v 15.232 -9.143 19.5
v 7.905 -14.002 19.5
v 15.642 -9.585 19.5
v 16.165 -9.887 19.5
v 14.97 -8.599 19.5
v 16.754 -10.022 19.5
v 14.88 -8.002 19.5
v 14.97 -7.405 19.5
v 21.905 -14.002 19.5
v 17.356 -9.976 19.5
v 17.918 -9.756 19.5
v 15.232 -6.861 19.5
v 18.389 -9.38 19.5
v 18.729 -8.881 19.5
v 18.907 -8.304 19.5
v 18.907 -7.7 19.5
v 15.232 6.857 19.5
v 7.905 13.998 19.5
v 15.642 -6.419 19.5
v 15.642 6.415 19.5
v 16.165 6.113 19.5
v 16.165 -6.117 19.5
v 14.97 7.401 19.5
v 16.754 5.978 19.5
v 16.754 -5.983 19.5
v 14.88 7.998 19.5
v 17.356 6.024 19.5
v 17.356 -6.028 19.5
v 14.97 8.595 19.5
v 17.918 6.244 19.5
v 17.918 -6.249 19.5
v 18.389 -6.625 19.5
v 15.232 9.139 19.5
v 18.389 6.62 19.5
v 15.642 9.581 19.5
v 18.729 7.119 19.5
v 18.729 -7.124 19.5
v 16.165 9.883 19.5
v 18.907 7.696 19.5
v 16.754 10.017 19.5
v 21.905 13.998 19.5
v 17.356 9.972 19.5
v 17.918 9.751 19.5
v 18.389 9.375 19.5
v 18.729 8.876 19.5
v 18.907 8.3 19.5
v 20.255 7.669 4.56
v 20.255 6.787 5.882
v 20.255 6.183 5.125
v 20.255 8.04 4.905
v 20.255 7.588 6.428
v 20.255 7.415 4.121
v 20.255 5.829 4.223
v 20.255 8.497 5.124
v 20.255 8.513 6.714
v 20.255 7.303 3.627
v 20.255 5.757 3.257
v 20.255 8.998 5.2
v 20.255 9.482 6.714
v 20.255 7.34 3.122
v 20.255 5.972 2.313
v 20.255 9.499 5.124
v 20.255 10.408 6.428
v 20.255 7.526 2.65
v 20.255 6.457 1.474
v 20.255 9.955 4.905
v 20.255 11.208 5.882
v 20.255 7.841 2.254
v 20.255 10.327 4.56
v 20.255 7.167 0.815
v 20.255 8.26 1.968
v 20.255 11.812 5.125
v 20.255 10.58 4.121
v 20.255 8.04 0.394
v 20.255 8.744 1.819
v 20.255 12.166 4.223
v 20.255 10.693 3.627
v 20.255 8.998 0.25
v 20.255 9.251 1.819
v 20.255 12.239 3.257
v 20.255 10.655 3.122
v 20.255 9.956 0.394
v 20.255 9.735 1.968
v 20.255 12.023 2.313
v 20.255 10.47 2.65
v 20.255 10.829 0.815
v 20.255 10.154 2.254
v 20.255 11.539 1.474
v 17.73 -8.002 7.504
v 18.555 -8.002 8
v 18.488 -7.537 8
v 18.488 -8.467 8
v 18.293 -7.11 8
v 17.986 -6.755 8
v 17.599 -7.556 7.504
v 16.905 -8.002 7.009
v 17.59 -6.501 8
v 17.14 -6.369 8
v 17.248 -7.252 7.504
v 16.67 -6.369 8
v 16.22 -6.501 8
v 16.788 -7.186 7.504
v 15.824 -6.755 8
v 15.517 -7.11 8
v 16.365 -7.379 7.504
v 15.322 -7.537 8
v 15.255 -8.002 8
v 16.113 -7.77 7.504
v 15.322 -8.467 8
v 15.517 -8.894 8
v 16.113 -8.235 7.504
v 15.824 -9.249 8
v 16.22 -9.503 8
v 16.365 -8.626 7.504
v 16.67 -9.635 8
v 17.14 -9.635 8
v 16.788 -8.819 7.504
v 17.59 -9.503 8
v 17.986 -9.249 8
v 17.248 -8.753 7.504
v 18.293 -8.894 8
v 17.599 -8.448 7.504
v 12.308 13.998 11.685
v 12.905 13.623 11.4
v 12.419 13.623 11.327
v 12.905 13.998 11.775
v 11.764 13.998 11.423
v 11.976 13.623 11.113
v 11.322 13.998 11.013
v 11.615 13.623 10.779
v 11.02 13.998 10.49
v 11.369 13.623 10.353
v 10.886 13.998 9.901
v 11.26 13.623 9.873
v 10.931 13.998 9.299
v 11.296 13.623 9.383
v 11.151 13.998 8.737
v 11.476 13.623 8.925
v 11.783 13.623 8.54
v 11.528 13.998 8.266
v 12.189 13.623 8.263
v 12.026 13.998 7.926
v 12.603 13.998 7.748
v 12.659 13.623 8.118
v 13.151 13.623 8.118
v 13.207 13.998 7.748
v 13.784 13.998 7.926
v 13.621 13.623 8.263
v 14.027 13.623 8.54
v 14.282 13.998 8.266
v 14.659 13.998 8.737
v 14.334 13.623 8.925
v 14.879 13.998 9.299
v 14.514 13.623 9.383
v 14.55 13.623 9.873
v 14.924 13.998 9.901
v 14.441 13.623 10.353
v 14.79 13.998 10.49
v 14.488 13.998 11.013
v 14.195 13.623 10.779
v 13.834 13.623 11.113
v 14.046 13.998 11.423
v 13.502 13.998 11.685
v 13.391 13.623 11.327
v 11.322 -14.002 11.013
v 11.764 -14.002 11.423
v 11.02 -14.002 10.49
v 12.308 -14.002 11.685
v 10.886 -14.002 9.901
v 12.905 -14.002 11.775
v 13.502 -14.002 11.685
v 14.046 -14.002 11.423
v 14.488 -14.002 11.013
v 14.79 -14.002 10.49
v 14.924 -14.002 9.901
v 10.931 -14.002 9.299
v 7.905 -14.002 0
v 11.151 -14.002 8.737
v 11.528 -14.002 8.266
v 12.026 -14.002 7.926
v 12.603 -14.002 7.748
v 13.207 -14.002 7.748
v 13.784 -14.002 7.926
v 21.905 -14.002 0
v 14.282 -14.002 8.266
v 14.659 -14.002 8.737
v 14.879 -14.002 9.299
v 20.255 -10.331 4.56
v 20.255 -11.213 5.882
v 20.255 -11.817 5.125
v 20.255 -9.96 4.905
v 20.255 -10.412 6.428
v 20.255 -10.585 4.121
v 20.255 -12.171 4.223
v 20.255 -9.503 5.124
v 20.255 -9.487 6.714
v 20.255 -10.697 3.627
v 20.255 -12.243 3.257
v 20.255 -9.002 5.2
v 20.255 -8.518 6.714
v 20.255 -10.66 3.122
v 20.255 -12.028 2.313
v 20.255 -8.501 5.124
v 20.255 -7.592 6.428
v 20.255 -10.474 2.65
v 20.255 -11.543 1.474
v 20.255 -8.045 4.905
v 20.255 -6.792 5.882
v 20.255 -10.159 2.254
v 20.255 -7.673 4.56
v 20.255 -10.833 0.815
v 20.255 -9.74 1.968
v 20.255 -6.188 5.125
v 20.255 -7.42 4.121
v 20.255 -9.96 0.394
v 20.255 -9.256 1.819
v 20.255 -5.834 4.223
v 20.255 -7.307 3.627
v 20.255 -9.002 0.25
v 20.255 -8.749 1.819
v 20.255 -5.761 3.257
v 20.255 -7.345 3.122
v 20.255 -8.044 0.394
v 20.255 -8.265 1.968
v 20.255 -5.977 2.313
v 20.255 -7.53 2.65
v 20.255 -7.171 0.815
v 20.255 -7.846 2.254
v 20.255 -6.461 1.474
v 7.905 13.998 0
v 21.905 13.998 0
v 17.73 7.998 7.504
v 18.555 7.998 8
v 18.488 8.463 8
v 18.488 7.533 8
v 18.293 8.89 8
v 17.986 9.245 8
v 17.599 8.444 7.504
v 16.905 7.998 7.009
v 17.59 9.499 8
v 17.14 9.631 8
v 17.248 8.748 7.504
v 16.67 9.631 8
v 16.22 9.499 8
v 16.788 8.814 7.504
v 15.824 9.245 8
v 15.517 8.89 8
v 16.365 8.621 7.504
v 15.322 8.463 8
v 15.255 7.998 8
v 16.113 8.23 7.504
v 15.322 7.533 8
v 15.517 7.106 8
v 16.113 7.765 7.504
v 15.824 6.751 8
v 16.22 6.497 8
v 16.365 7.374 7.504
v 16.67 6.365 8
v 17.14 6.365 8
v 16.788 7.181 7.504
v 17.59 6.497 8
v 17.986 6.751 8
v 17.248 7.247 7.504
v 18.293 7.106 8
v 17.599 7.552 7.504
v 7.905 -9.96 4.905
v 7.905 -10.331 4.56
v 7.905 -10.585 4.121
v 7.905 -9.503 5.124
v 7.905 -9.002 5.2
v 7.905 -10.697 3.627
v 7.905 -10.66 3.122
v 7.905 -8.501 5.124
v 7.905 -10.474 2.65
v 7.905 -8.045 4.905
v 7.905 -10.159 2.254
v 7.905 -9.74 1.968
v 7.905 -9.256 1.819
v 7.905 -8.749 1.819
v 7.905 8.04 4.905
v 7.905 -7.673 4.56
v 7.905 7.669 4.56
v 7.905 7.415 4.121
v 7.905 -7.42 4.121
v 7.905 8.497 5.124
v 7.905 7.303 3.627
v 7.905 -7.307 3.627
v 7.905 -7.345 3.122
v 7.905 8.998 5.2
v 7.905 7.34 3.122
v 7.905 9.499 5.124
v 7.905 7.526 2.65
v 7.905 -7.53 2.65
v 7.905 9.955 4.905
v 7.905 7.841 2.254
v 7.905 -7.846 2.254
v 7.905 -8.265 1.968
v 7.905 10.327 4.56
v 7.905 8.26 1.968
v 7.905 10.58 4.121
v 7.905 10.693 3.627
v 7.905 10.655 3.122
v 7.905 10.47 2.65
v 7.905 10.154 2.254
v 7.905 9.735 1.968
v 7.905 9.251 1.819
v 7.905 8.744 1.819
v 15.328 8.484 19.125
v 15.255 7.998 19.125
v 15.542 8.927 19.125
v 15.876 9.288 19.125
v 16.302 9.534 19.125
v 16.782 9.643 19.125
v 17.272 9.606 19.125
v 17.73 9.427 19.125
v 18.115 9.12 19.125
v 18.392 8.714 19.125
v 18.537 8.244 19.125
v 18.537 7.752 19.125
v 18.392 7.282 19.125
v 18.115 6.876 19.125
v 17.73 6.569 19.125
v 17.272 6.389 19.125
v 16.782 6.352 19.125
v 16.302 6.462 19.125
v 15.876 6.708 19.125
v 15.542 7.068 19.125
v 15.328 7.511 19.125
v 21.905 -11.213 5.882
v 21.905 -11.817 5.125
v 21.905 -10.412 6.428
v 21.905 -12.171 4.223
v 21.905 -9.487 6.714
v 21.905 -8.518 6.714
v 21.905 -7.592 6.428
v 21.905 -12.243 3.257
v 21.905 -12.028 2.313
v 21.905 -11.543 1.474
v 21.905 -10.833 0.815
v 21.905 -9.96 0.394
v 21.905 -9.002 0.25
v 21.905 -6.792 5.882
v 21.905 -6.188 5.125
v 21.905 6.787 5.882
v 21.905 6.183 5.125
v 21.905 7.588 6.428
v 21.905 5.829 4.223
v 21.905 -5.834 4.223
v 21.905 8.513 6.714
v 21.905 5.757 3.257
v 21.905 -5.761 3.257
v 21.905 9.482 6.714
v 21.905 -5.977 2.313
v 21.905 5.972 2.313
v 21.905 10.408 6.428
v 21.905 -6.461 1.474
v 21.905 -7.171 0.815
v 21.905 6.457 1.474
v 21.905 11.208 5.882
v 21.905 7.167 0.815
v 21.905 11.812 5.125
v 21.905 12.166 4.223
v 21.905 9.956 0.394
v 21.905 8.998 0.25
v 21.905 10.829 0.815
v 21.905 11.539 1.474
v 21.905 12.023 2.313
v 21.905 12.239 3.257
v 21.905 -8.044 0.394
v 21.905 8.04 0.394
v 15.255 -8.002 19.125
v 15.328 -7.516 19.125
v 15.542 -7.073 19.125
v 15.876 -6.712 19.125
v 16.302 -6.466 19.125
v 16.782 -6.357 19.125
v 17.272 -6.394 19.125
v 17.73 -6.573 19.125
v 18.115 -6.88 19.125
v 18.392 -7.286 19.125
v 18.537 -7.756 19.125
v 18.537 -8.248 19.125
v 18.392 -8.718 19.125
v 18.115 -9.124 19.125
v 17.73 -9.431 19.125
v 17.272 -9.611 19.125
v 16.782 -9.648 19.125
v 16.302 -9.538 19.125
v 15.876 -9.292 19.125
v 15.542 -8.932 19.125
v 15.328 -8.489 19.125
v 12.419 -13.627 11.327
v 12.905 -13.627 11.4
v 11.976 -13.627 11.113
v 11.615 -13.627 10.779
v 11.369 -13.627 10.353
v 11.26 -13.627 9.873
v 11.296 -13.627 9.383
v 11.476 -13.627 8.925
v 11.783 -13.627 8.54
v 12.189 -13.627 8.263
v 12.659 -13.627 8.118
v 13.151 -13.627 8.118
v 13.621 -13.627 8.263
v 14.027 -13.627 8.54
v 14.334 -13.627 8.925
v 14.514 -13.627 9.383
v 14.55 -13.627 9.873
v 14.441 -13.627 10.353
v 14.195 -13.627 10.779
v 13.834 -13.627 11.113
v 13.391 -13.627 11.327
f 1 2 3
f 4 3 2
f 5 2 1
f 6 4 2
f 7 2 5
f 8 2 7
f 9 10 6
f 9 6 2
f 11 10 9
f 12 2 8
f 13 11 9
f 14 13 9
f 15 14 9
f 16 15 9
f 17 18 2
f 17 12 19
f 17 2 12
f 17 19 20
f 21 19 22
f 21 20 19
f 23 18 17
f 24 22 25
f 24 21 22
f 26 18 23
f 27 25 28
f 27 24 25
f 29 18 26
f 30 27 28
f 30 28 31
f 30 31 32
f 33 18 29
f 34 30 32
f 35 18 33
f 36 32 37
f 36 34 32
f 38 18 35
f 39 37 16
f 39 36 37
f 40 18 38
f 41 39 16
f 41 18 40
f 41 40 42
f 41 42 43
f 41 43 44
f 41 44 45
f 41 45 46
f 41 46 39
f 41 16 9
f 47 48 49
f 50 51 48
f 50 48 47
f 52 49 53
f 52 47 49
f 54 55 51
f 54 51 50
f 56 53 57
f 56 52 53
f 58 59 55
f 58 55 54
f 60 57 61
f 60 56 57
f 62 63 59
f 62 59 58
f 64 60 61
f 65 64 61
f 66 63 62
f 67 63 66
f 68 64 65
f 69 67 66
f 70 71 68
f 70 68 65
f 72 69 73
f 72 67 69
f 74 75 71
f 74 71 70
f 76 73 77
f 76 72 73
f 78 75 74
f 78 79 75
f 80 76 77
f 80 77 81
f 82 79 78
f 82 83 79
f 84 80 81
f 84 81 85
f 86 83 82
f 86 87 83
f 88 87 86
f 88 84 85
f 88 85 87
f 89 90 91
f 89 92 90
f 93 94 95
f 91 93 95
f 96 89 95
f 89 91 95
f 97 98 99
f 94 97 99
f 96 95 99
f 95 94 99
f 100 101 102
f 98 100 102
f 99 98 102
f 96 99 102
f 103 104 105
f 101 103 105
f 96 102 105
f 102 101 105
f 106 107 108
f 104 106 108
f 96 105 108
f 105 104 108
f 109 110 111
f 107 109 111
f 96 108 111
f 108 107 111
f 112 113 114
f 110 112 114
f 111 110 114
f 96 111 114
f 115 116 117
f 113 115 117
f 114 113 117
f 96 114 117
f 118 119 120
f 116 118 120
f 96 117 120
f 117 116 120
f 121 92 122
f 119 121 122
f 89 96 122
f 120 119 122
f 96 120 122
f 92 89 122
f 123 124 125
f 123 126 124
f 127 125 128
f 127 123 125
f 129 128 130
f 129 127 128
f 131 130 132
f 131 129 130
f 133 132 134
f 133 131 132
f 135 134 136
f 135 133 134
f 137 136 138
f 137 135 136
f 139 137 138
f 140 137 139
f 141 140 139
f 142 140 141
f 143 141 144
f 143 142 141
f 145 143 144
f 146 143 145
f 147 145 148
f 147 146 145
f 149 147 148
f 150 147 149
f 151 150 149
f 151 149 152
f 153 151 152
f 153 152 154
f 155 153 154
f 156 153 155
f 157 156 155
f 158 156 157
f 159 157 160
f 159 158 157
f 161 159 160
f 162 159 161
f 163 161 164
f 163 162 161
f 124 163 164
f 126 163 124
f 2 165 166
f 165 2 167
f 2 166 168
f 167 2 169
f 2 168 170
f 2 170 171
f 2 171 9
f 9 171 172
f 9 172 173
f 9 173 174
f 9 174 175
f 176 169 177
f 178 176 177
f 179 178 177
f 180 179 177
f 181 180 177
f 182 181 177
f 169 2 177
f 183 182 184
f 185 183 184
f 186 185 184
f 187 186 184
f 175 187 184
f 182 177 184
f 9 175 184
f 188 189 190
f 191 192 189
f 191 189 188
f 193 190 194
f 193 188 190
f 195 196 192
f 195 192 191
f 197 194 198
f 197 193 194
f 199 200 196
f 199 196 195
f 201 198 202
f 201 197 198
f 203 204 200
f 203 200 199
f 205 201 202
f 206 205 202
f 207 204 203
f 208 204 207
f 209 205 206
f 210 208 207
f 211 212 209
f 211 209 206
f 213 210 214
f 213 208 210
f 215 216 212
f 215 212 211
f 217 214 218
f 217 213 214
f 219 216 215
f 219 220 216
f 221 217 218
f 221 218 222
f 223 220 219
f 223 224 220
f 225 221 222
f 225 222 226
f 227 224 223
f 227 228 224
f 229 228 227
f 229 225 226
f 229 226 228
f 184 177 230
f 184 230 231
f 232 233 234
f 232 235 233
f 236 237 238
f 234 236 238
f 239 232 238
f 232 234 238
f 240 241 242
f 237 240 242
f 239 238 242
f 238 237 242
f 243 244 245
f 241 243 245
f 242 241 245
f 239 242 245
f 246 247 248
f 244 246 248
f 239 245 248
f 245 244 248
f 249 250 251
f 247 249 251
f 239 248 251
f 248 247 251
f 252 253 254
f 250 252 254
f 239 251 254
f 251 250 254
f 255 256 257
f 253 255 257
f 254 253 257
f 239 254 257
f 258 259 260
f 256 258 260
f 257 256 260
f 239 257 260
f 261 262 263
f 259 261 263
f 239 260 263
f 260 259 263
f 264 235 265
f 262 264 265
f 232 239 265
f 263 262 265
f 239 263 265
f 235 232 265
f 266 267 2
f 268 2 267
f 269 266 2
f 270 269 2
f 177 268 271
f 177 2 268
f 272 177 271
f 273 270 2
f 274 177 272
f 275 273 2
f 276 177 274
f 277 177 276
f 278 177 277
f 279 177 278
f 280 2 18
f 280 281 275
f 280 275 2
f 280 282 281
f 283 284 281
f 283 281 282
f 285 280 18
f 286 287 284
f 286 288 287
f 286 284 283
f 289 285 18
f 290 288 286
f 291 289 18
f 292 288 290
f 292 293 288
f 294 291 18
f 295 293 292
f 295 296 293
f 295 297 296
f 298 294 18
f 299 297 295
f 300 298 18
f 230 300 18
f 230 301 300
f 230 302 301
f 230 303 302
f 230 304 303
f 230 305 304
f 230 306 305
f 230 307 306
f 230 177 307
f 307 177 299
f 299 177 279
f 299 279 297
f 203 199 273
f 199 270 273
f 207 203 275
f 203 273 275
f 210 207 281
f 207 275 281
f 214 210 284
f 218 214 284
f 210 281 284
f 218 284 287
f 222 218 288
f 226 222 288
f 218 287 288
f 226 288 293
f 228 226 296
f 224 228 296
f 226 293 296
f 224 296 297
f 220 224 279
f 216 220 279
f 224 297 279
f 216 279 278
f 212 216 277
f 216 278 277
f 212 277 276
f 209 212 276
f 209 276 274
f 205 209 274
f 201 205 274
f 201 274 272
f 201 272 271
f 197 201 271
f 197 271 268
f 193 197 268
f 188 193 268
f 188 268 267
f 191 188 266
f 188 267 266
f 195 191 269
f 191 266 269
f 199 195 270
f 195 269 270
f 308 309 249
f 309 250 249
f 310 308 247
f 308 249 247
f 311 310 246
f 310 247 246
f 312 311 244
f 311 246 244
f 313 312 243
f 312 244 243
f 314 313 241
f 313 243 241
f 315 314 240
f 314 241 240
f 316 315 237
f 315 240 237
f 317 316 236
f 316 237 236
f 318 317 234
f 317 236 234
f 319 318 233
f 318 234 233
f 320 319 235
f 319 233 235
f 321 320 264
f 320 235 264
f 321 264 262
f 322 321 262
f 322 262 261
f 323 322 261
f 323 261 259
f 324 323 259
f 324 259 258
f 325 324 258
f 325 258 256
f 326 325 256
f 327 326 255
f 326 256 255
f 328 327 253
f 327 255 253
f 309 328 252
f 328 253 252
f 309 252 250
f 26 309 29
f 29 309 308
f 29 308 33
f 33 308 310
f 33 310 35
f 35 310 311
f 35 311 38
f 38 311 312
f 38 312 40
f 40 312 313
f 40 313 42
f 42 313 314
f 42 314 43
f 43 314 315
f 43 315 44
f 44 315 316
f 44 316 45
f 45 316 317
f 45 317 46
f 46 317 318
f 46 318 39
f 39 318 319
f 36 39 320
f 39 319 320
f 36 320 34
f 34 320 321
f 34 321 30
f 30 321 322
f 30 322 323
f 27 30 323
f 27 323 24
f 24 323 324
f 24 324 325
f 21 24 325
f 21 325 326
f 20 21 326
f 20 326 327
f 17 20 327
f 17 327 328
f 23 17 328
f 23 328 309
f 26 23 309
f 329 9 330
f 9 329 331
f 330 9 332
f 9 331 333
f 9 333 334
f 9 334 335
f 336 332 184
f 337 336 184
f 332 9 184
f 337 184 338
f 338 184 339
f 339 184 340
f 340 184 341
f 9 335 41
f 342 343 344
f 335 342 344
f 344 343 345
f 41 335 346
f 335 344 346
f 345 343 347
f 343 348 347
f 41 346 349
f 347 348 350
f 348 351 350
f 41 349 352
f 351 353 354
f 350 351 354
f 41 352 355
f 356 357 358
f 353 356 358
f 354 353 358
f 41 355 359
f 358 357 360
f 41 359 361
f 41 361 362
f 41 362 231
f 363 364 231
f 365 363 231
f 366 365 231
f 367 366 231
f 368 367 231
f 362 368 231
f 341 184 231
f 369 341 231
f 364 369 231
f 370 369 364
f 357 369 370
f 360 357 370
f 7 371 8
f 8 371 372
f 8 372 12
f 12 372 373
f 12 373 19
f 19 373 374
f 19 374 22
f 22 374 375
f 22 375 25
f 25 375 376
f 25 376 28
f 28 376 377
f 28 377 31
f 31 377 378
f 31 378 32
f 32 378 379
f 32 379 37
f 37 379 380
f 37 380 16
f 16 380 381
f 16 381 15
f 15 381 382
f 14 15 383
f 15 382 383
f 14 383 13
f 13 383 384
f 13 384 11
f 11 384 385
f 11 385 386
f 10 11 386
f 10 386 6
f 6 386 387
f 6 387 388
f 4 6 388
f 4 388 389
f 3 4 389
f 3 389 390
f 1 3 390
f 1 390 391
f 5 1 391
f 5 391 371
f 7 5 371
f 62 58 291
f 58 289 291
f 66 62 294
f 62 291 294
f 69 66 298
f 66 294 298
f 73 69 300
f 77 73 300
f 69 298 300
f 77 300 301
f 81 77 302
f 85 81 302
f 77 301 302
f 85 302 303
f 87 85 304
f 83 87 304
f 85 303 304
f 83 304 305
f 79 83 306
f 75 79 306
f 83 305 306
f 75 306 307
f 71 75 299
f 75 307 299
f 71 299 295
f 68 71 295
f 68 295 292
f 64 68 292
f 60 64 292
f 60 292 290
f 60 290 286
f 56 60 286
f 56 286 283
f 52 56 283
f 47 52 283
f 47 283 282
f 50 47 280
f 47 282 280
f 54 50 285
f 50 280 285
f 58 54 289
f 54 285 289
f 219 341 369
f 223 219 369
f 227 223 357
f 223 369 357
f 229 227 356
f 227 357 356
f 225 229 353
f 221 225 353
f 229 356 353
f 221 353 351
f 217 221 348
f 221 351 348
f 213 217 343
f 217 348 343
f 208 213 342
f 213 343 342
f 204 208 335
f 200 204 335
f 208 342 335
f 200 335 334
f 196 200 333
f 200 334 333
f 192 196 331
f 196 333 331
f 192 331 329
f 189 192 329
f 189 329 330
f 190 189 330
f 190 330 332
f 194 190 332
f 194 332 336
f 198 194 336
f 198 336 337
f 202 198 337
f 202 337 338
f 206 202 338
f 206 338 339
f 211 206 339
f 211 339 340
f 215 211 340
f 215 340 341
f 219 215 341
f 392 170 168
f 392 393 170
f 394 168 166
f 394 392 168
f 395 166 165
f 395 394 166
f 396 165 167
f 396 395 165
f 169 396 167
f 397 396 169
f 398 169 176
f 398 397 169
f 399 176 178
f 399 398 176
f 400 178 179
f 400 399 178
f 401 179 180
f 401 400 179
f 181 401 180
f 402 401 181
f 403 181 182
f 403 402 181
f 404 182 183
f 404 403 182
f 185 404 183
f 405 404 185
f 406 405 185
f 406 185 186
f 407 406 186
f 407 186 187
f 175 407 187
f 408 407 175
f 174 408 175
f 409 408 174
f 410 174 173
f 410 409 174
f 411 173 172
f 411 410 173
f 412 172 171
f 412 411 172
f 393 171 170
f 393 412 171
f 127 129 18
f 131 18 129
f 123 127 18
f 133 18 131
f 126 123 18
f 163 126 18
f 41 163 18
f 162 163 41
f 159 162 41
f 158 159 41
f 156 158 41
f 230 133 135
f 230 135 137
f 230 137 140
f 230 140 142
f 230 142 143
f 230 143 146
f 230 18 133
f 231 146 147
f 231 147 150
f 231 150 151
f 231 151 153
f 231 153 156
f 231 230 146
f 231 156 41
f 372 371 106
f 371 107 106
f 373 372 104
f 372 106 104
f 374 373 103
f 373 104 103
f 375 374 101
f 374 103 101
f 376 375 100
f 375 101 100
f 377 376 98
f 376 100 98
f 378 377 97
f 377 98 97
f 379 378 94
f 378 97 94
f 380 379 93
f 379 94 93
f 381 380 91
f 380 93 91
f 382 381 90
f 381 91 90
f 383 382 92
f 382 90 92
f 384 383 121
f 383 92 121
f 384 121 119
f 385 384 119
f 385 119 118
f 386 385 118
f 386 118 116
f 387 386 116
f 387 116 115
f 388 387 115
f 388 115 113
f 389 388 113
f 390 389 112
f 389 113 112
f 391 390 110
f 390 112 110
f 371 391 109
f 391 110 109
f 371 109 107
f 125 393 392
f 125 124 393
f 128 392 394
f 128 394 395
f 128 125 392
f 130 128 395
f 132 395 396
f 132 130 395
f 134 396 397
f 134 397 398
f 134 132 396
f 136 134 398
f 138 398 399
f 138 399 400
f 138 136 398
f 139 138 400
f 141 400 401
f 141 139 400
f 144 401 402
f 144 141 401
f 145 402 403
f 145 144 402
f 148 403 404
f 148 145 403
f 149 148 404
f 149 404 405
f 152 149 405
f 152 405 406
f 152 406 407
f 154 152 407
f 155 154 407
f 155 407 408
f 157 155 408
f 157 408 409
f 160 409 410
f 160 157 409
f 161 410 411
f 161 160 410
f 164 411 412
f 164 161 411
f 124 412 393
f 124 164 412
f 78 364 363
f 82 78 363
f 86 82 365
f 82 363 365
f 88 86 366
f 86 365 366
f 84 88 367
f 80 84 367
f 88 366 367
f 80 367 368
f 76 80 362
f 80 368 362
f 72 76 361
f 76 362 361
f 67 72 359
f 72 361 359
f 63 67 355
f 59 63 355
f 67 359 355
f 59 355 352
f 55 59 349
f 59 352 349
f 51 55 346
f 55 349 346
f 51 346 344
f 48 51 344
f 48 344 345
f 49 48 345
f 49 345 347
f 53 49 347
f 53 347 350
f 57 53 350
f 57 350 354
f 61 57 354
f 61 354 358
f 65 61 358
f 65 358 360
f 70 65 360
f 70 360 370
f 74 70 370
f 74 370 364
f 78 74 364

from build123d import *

# Parameters (mm, degrees)
ESQUISSE1_W                                      = 14
ESQUISSE1_H                                      = 28
BOSS_EXTRU_1_DEPTH                               = 19.5
CHAMBRAGE_POUR_VIS_T_TE_RONDE_6_PANS_D           = 3.4
CHAMBRAGE_POUR_VIS_T_TE_RONDE_6_PANS_CBORE_D     = 6.5
CHAMBRAGE_POUR_VIS_T_TE_RONDE_6_PANS_CBORE_DEPTH = 1.65
TROU_TARAUD_M4X0_72_D                            = 3.3
TROU_TARAUD_M4X0_72_DEPTH                        = 11.5
TROU_TARAUD_M4X0_72_CSINK_D                      = 4.05
TROU_TARAUD_M4X0_72_CSINK_ANGLE                  = 90
TROU_TARAUD_M4X0_72_TIP                          = 0.991420021


with BuildPart() as part:
    # Esquisse1 → Boss.-Extru.1 (new body)
    with BuildSketch(Plane.XY):
        with Locations((14.905012229, -0.00220912)):
            Rectangle(ESQUISSE1_W, ESQUISSE1_H)
    extrude(amount=BOSS_EXTRU_1_DEPTH)

    # Chambrage pour Vis à tête ronde à 6 pans creux M31 (through all)
    with Locations(Plane(origin=(21.905012229, 0, 0), x_dir=(0, 0, -1), z_dir=(1, 0, 0))):
        with Locations((-3.5, 8.99779088), (-3.5, -9.00220912)):
            CounterBoreHole(CHAMBRAGE_POUR_VIS_T_TE_RONDE_6_PANS_D / 2, CHAMBRAGE_POUR_VIS_T_TE_RONDE_6_PANS_CBORE_D / 2, CHAMBRAGE_POUR_VIS_T_TE_RONDE_6_PANS_CBORE_DEPTH)

    # Trou taraudé M4x0.72
    with Locations(Plane.XY.offset(19.5)):
        with Locations((16.905012229, 7.99779088), (16.905012229, -8.00220912)):
            CounterSinkHole(TROU_TARAUD_M4X0_72_D / 2, TROU_TARAUD_M4X0_72_CSINK_D / 2, depth=TROU_TARAUD_M4X0_72_DEPTH, counter_sink_angle=TROU_TARAUD_M4X0_72_CSINK_ANGLE)
            with Locations((0, 0, -(TROU_TARAUD_M4X0_72_DEPTH + TROU_TARAUD_M4X0_72_TIP / 2))):  # 118° drill point
                Cone(0, TROU_TARAUD_M4X0_72_D / 2, TROU_TARAUD_M4X0_72_TIP, mode=Mode.SUBTRACT)

    # Esquisse15 → Trou taraudé M4x0.73 (revolve, cut)
    with BuildSketch(Plane(origin=(12.905012229, 13.99779088, 9.75), x_dir=(0, 0, 1), z_dir=(1, 0, 0))):
        Polygon((0, 0), (0, 28), (2.025, 28), (1.65, 27.625), (1.65, 0.375), (2.025, 0), align=None)
    revolve(axis=Axis((12.905012229, 20.34779088, 9.75), (0, -1, 0)), mode=Mode.SUBTRACT)


solid = part.part
